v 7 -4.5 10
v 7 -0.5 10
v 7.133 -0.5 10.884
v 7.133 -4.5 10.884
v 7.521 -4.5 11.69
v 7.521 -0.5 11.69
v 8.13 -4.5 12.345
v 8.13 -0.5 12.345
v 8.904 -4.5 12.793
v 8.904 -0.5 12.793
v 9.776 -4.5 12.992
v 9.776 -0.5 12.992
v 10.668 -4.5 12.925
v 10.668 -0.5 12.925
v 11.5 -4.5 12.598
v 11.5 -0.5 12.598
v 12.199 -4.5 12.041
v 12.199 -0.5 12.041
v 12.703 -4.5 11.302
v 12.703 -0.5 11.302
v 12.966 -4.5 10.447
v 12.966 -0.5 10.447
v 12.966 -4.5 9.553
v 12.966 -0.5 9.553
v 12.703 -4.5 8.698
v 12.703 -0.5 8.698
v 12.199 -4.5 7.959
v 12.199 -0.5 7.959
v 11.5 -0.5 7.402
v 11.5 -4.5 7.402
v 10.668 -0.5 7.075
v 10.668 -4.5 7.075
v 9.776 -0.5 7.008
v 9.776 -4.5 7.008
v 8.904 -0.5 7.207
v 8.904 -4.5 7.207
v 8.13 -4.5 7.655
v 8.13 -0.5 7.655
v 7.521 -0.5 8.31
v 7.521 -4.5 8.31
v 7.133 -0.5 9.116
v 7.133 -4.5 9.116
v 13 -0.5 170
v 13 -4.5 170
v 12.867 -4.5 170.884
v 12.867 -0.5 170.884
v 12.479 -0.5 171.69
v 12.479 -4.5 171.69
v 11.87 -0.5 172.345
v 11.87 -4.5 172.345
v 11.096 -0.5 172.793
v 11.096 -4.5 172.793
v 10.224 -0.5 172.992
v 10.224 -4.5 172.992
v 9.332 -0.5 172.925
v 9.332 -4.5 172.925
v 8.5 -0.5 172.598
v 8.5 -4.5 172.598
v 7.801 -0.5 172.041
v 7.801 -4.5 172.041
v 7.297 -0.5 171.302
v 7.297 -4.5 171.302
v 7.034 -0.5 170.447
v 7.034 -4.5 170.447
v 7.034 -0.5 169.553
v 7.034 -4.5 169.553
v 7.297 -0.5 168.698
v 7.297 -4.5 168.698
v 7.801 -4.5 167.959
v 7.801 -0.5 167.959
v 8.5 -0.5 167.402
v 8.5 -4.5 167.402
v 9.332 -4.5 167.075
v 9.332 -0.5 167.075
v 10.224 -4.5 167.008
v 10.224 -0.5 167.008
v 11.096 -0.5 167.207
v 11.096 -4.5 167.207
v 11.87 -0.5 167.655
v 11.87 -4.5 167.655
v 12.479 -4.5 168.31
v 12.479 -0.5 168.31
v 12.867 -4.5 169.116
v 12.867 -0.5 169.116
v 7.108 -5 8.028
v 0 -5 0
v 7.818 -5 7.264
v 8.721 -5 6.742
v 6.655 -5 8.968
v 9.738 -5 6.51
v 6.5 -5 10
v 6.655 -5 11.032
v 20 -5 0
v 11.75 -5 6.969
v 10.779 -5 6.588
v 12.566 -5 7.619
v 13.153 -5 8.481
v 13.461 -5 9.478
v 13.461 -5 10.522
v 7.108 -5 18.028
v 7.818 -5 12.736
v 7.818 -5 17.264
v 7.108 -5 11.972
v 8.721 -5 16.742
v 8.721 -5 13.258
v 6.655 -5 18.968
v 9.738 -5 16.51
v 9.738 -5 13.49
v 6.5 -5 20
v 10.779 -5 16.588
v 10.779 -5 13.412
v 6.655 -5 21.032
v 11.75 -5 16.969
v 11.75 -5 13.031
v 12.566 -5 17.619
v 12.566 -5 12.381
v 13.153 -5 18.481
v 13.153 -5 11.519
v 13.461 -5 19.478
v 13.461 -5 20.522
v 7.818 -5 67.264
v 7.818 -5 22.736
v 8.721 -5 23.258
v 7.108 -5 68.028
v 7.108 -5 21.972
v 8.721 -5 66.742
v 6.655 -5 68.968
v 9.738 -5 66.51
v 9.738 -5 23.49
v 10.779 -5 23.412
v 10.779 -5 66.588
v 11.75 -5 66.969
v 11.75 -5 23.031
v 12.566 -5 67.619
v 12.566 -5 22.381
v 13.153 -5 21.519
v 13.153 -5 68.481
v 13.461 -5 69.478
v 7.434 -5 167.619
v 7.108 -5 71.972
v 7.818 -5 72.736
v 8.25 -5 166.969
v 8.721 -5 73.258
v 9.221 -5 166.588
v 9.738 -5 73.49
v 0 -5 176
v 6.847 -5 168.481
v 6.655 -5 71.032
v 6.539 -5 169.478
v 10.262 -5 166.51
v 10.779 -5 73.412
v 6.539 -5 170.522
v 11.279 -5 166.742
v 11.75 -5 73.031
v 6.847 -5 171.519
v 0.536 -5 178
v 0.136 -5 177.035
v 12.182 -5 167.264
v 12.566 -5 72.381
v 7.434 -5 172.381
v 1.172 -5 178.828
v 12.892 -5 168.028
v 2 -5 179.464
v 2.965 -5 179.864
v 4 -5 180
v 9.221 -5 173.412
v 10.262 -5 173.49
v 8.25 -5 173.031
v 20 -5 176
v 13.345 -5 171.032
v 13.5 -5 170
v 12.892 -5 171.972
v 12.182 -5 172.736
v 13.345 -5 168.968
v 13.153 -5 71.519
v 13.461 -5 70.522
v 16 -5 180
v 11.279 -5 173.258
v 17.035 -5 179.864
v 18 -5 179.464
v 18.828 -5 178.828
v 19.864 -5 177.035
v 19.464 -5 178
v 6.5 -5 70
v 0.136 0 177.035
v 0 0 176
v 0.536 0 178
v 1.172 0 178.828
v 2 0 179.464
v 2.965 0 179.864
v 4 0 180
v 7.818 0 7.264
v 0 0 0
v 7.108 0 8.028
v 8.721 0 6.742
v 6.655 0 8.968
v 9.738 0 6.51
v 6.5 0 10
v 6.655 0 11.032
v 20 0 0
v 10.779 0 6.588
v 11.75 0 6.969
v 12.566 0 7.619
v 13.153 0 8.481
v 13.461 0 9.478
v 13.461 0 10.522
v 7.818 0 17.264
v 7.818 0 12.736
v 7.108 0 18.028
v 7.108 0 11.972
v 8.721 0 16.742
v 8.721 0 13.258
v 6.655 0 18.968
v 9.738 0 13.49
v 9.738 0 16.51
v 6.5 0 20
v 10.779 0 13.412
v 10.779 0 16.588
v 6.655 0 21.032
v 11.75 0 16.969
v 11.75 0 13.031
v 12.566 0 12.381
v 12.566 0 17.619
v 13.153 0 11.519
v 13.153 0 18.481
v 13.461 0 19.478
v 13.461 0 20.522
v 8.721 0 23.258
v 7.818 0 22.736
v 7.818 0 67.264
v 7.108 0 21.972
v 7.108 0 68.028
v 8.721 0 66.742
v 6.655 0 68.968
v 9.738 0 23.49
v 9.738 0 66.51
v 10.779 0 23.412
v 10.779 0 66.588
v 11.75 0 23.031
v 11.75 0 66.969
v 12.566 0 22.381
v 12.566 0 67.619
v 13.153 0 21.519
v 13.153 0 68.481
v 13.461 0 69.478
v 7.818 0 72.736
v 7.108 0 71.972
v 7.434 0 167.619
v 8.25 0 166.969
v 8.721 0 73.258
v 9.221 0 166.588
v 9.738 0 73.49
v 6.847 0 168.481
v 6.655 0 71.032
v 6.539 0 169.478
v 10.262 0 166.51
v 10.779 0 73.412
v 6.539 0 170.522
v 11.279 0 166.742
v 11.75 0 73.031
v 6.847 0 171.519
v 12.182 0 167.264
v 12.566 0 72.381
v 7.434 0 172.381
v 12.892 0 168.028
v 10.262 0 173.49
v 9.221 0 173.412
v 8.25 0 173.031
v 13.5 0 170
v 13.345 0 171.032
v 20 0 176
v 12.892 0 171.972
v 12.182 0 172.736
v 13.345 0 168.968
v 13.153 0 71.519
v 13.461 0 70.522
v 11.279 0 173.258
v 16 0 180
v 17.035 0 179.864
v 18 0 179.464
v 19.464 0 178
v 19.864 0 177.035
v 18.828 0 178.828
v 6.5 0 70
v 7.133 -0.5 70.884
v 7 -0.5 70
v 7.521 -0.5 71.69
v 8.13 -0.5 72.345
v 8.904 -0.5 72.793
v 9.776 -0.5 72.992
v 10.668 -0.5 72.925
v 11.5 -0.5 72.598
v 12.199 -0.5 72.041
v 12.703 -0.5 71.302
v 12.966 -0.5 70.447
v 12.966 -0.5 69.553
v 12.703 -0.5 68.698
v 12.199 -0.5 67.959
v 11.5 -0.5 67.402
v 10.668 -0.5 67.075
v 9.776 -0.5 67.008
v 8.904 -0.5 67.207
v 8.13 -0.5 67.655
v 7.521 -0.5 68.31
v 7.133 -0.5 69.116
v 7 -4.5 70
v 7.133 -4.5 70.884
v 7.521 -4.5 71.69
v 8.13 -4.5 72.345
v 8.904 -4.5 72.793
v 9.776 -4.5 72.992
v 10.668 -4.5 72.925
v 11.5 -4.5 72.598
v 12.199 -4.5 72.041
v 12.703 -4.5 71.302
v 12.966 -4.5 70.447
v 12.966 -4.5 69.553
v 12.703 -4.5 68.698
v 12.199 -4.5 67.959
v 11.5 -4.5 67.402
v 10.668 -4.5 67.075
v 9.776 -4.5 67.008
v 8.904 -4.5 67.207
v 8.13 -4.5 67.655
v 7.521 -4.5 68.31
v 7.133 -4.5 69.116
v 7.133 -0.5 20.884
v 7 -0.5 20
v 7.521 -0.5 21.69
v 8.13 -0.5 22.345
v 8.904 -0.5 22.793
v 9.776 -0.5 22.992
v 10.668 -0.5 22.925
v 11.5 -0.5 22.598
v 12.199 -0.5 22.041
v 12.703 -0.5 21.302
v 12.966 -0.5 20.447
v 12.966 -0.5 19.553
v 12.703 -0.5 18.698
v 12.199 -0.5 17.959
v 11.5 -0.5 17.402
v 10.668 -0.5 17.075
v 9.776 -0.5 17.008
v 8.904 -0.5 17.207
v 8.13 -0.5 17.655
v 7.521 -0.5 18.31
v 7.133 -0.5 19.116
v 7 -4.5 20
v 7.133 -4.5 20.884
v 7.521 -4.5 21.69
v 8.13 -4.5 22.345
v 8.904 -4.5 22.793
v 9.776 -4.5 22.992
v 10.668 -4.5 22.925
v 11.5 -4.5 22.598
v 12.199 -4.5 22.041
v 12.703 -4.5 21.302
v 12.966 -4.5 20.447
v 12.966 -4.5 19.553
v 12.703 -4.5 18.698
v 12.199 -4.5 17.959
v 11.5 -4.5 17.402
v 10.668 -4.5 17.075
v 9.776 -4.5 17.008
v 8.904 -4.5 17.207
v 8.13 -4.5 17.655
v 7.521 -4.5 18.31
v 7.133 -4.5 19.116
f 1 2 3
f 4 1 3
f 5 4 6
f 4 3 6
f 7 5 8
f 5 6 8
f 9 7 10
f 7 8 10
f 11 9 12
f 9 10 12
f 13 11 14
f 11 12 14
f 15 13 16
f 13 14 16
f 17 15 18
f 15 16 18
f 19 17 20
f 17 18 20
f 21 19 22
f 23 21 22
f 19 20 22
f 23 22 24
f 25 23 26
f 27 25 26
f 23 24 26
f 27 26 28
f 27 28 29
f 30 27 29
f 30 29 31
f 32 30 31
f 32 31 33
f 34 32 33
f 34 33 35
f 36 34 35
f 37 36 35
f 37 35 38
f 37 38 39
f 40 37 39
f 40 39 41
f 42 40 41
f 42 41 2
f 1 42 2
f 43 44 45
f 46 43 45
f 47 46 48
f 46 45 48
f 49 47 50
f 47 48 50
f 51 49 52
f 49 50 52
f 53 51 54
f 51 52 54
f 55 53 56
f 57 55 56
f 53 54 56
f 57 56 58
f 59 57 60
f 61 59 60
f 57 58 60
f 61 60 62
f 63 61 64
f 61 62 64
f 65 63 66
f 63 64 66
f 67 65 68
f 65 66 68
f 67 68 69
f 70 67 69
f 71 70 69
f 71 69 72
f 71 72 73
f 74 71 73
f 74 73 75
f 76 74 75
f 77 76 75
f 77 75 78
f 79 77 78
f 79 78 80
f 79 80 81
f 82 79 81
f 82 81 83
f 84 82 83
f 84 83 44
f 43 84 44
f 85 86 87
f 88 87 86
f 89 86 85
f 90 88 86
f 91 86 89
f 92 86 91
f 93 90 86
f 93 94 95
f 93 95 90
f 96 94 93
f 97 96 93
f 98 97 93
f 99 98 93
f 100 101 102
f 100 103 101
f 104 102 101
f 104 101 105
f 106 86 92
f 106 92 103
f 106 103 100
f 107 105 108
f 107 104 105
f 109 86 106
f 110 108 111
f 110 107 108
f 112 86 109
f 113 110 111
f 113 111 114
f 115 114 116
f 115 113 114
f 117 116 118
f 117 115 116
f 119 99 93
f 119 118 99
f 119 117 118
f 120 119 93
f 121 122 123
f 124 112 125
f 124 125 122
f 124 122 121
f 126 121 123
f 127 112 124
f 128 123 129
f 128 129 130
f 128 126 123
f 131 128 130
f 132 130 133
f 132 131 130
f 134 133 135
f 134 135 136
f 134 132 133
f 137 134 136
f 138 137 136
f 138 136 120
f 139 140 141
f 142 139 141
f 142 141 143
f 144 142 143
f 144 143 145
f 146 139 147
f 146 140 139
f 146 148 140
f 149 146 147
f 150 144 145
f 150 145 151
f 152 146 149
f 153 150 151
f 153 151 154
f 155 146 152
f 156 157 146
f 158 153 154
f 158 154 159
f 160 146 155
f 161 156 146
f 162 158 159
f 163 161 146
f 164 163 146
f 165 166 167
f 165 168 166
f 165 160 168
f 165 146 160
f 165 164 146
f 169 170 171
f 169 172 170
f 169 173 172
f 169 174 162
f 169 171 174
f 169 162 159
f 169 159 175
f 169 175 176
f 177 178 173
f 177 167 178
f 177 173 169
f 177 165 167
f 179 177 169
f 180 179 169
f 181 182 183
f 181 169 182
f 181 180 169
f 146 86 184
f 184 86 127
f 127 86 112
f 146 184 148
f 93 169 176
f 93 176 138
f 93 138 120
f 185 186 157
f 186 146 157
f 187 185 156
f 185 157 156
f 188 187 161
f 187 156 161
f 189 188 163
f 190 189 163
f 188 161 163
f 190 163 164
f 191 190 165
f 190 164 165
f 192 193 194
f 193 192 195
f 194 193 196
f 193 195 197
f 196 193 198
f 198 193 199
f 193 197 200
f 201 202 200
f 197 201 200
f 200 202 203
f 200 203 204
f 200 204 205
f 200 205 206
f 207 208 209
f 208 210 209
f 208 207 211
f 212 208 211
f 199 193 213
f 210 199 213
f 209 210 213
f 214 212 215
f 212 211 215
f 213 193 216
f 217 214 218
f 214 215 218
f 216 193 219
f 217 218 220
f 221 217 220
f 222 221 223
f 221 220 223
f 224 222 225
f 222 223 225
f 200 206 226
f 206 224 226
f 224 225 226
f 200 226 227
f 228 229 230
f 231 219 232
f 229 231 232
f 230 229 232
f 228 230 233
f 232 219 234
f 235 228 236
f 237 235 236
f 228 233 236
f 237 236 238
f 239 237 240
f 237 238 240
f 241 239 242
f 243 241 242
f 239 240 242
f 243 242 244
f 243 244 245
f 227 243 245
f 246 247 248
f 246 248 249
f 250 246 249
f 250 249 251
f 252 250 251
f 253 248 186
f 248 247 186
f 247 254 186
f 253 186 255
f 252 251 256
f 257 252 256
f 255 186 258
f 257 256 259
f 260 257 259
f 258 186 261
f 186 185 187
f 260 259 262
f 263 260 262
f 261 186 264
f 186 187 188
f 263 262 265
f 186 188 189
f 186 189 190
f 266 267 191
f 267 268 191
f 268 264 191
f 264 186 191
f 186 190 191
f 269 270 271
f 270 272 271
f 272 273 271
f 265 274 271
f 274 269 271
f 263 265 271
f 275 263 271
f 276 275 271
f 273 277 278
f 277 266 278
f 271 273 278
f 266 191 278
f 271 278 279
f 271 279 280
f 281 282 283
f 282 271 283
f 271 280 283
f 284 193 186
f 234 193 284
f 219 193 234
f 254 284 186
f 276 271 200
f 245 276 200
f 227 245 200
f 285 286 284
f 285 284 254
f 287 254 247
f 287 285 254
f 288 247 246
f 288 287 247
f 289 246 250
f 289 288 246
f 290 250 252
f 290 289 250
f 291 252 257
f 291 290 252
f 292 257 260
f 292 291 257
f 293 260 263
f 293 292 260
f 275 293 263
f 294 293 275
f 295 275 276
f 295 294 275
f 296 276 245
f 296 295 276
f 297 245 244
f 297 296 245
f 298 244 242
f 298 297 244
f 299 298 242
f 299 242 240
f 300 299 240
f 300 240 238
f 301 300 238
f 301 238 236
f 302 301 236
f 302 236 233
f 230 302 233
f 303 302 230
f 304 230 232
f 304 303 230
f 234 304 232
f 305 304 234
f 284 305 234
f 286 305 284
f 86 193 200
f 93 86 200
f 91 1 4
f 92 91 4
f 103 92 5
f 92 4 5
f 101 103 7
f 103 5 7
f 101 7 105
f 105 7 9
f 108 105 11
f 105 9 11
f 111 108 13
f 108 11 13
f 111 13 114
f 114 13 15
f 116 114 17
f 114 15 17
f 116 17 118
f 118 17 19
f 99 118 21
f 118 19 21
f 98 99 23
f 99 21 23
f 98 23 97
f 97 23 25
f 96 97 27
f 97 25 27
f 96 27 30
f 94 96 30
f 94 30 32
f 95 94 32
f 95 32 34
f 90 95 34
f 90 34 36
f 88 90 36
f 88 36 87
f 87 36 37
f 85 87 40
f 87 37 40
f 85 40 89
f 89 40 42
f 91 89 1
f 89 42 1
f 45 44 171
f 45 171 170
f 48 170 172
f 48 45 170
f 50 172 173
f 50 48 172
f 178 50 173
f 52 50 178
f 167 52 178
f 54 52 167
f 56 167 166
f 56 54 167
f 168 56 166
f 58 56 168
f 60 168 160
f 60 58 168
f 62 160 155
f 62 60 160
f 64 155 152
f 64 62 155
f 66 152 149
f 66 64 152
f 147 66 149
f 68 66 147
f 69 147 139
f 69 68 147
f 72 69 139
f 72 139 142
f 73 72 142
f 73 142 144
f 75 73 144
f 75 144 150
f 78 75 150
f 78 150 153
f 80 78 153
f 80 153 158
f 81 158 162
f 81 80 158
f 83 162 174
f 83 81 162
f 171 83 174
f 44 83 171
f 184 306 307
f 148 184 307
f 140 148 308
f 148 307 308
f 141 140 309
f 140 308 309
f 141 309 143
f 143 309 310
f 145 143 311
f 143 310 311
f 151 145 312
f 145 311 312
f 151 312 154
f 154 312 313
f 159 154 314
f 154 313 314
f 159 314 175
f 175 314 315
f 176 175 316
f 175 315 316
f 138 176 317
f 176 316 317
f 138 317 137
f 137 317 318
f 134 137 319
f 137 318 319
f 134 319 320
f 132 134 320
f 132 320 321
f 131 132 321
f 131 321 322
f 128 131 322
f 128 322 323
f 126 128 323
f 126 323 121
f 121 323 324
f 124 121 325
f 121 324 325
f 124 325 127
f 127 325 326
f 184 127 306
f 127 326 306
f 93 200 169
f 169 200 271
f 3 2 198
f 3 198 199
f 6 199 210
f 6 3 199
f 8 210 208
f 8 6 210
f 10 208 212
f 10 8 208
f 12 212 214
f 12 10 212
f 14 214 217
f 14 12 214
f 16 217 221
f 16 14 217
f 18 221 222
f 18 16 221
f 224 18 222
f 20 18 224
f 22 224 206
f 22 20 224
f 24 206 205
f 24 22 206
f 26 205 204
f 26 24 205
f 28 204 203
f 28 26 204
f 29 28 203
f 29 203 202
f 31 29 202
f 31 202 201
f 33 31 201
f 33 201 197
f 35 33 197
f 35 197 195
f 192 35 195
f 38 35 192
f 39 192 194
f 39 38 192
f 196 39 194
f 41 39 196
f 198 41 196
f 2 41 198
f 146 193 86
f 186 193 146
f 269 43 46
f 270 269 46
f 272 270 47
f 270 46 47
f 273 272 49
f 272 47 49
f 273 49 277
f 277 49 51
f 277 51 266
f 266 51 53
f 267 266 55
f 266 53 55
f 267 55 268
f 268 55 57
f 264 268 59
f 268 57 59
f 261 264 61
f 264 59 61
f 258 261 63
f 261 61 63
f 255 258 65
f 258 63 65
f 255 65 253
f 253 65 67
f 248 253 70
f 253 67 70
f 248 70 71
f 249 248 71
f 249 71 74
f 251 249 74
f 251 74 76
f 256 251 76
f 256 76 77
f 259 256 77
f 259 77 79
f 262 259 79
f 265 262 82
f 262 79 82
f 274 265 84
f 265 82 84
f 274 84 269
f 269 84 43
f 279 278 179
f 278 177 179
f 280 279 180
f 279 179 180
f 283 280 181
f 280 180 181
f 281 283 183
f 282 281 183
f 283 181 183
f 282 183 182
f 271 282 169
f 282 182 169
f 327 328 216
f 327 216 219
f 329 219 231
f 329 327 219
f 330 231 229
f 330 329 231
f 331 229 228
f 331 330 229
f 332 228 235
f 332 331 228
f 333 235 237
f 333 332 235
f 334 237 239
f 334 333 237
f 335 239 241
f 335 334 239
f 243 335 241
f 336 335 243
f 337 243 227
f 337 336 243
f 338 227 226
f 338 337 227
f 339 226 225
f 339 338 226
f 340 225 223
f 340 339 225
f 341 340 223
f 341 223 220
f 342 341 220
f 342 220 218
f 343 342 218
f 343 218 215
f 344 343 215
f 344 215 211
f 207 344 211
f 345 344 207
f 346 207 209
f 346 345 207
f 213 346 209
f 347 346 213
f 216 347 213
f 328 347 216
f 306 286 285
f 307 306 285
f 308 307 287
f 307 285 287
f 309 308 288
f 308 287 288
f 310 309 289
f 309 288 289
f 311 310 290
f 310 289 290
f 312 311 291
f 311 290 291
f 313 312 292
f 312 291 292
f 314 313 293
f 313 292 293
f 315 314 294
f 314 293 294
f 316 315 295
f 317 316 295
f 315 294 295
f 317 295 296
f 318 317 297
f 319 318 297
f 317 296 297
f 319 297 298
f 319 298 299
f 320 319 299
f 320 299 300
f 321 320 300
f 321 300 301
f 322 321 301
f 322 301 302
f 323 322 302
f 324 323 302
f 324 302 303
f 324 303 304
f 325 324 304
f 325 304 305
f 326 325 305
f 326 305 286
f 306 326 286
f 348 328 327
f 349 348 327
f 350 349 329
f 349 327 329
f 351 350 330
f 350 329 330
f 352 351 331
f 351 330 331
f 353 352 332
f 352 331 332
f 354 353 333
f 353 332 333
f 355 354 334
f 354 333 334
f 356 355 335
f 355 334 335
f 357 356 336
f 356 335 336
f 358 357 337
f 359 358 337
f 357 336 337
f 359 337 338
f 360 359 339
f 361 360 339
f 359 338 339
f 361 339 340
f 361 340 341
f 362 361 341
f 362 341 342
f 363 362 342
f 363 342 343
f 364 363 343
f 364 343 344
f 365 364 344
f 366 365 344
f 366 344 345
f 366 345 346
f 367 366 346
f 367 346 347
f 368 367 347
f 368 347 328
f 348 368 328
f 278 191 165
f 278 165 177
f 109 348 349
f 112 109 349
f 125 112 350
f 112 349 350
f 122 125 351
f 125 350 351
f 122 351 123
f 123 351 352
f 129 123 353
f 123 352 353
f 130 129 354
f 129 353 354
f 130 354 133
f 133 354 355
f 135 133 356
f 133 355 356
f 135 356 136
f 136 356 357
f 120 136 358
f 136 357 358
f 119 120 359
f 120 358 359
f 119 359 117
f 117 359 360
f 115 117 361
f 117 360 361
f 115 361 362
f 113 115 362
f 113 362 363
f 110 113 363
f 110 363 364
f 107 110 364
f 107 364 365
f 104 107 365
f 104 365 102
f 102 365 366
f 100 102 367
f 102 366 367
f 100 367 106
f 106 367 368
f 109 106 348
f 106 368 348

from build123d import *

# Parameters (mm, degrees)
F0_W     = 20
F0_H     = 180
F1_DEPTH = 5
F2_R     = 3
F3_DEPTH = 5.001
F5_D     = 6
F7_D     = 6
F8_SIZE  = 0.5
F9_R     = 4


with BuildPart() as f1:
    # F0 (on Front) → F1 (new body)
    with BuildSketch(Plane.XZ):
        with Locations((10, 90)):
            Rectangle(F0_W, F0_H)
    extrude(amount=F1_DEPTH)

    # F2 (on face) → F3 (cut, through all)
    with BuildSketch(Plane.XZ.offset(5)):
        with Locations((10, 170)):
            Circle(F2_R)
    extrude(amount=-F3_DEPTH, mode=Mode.SUBTRACT)

    # F5 (through all)
    with Locations(Plane.XZ.offset(5)):
        with Locations((10, 70)):
            Hole(F5_D / 2)

    # F7 (through all)
    with Locations(Plane.XZ.offset(5)):
        with Locations((10, 10), (10, 20)):
            Hole(F7_D / 2)

    # F8
    f8_edges = [f1.edges().sort_by_distance(p)[0] for p in [
        (7, -5, 170),
        (7, 0, 170),
        (7, 0, 10),
        (7, 0, 20),
        (7, 0, 70),
        (7, -5, 10),
        (7, -5, 20),
        (7, -5, 70),
    ]]
    chamfer(f8_edges, length=F8_SIZE)

    # F9
    f9_edges = [f1.edges().sort_by_distance(p)[0] for p in [
        (20, -2.5, 180),
        (0, -2.5, 180),
    ]]
    fillet(f9_edges, radius=F9_R)


solid = f1.part
